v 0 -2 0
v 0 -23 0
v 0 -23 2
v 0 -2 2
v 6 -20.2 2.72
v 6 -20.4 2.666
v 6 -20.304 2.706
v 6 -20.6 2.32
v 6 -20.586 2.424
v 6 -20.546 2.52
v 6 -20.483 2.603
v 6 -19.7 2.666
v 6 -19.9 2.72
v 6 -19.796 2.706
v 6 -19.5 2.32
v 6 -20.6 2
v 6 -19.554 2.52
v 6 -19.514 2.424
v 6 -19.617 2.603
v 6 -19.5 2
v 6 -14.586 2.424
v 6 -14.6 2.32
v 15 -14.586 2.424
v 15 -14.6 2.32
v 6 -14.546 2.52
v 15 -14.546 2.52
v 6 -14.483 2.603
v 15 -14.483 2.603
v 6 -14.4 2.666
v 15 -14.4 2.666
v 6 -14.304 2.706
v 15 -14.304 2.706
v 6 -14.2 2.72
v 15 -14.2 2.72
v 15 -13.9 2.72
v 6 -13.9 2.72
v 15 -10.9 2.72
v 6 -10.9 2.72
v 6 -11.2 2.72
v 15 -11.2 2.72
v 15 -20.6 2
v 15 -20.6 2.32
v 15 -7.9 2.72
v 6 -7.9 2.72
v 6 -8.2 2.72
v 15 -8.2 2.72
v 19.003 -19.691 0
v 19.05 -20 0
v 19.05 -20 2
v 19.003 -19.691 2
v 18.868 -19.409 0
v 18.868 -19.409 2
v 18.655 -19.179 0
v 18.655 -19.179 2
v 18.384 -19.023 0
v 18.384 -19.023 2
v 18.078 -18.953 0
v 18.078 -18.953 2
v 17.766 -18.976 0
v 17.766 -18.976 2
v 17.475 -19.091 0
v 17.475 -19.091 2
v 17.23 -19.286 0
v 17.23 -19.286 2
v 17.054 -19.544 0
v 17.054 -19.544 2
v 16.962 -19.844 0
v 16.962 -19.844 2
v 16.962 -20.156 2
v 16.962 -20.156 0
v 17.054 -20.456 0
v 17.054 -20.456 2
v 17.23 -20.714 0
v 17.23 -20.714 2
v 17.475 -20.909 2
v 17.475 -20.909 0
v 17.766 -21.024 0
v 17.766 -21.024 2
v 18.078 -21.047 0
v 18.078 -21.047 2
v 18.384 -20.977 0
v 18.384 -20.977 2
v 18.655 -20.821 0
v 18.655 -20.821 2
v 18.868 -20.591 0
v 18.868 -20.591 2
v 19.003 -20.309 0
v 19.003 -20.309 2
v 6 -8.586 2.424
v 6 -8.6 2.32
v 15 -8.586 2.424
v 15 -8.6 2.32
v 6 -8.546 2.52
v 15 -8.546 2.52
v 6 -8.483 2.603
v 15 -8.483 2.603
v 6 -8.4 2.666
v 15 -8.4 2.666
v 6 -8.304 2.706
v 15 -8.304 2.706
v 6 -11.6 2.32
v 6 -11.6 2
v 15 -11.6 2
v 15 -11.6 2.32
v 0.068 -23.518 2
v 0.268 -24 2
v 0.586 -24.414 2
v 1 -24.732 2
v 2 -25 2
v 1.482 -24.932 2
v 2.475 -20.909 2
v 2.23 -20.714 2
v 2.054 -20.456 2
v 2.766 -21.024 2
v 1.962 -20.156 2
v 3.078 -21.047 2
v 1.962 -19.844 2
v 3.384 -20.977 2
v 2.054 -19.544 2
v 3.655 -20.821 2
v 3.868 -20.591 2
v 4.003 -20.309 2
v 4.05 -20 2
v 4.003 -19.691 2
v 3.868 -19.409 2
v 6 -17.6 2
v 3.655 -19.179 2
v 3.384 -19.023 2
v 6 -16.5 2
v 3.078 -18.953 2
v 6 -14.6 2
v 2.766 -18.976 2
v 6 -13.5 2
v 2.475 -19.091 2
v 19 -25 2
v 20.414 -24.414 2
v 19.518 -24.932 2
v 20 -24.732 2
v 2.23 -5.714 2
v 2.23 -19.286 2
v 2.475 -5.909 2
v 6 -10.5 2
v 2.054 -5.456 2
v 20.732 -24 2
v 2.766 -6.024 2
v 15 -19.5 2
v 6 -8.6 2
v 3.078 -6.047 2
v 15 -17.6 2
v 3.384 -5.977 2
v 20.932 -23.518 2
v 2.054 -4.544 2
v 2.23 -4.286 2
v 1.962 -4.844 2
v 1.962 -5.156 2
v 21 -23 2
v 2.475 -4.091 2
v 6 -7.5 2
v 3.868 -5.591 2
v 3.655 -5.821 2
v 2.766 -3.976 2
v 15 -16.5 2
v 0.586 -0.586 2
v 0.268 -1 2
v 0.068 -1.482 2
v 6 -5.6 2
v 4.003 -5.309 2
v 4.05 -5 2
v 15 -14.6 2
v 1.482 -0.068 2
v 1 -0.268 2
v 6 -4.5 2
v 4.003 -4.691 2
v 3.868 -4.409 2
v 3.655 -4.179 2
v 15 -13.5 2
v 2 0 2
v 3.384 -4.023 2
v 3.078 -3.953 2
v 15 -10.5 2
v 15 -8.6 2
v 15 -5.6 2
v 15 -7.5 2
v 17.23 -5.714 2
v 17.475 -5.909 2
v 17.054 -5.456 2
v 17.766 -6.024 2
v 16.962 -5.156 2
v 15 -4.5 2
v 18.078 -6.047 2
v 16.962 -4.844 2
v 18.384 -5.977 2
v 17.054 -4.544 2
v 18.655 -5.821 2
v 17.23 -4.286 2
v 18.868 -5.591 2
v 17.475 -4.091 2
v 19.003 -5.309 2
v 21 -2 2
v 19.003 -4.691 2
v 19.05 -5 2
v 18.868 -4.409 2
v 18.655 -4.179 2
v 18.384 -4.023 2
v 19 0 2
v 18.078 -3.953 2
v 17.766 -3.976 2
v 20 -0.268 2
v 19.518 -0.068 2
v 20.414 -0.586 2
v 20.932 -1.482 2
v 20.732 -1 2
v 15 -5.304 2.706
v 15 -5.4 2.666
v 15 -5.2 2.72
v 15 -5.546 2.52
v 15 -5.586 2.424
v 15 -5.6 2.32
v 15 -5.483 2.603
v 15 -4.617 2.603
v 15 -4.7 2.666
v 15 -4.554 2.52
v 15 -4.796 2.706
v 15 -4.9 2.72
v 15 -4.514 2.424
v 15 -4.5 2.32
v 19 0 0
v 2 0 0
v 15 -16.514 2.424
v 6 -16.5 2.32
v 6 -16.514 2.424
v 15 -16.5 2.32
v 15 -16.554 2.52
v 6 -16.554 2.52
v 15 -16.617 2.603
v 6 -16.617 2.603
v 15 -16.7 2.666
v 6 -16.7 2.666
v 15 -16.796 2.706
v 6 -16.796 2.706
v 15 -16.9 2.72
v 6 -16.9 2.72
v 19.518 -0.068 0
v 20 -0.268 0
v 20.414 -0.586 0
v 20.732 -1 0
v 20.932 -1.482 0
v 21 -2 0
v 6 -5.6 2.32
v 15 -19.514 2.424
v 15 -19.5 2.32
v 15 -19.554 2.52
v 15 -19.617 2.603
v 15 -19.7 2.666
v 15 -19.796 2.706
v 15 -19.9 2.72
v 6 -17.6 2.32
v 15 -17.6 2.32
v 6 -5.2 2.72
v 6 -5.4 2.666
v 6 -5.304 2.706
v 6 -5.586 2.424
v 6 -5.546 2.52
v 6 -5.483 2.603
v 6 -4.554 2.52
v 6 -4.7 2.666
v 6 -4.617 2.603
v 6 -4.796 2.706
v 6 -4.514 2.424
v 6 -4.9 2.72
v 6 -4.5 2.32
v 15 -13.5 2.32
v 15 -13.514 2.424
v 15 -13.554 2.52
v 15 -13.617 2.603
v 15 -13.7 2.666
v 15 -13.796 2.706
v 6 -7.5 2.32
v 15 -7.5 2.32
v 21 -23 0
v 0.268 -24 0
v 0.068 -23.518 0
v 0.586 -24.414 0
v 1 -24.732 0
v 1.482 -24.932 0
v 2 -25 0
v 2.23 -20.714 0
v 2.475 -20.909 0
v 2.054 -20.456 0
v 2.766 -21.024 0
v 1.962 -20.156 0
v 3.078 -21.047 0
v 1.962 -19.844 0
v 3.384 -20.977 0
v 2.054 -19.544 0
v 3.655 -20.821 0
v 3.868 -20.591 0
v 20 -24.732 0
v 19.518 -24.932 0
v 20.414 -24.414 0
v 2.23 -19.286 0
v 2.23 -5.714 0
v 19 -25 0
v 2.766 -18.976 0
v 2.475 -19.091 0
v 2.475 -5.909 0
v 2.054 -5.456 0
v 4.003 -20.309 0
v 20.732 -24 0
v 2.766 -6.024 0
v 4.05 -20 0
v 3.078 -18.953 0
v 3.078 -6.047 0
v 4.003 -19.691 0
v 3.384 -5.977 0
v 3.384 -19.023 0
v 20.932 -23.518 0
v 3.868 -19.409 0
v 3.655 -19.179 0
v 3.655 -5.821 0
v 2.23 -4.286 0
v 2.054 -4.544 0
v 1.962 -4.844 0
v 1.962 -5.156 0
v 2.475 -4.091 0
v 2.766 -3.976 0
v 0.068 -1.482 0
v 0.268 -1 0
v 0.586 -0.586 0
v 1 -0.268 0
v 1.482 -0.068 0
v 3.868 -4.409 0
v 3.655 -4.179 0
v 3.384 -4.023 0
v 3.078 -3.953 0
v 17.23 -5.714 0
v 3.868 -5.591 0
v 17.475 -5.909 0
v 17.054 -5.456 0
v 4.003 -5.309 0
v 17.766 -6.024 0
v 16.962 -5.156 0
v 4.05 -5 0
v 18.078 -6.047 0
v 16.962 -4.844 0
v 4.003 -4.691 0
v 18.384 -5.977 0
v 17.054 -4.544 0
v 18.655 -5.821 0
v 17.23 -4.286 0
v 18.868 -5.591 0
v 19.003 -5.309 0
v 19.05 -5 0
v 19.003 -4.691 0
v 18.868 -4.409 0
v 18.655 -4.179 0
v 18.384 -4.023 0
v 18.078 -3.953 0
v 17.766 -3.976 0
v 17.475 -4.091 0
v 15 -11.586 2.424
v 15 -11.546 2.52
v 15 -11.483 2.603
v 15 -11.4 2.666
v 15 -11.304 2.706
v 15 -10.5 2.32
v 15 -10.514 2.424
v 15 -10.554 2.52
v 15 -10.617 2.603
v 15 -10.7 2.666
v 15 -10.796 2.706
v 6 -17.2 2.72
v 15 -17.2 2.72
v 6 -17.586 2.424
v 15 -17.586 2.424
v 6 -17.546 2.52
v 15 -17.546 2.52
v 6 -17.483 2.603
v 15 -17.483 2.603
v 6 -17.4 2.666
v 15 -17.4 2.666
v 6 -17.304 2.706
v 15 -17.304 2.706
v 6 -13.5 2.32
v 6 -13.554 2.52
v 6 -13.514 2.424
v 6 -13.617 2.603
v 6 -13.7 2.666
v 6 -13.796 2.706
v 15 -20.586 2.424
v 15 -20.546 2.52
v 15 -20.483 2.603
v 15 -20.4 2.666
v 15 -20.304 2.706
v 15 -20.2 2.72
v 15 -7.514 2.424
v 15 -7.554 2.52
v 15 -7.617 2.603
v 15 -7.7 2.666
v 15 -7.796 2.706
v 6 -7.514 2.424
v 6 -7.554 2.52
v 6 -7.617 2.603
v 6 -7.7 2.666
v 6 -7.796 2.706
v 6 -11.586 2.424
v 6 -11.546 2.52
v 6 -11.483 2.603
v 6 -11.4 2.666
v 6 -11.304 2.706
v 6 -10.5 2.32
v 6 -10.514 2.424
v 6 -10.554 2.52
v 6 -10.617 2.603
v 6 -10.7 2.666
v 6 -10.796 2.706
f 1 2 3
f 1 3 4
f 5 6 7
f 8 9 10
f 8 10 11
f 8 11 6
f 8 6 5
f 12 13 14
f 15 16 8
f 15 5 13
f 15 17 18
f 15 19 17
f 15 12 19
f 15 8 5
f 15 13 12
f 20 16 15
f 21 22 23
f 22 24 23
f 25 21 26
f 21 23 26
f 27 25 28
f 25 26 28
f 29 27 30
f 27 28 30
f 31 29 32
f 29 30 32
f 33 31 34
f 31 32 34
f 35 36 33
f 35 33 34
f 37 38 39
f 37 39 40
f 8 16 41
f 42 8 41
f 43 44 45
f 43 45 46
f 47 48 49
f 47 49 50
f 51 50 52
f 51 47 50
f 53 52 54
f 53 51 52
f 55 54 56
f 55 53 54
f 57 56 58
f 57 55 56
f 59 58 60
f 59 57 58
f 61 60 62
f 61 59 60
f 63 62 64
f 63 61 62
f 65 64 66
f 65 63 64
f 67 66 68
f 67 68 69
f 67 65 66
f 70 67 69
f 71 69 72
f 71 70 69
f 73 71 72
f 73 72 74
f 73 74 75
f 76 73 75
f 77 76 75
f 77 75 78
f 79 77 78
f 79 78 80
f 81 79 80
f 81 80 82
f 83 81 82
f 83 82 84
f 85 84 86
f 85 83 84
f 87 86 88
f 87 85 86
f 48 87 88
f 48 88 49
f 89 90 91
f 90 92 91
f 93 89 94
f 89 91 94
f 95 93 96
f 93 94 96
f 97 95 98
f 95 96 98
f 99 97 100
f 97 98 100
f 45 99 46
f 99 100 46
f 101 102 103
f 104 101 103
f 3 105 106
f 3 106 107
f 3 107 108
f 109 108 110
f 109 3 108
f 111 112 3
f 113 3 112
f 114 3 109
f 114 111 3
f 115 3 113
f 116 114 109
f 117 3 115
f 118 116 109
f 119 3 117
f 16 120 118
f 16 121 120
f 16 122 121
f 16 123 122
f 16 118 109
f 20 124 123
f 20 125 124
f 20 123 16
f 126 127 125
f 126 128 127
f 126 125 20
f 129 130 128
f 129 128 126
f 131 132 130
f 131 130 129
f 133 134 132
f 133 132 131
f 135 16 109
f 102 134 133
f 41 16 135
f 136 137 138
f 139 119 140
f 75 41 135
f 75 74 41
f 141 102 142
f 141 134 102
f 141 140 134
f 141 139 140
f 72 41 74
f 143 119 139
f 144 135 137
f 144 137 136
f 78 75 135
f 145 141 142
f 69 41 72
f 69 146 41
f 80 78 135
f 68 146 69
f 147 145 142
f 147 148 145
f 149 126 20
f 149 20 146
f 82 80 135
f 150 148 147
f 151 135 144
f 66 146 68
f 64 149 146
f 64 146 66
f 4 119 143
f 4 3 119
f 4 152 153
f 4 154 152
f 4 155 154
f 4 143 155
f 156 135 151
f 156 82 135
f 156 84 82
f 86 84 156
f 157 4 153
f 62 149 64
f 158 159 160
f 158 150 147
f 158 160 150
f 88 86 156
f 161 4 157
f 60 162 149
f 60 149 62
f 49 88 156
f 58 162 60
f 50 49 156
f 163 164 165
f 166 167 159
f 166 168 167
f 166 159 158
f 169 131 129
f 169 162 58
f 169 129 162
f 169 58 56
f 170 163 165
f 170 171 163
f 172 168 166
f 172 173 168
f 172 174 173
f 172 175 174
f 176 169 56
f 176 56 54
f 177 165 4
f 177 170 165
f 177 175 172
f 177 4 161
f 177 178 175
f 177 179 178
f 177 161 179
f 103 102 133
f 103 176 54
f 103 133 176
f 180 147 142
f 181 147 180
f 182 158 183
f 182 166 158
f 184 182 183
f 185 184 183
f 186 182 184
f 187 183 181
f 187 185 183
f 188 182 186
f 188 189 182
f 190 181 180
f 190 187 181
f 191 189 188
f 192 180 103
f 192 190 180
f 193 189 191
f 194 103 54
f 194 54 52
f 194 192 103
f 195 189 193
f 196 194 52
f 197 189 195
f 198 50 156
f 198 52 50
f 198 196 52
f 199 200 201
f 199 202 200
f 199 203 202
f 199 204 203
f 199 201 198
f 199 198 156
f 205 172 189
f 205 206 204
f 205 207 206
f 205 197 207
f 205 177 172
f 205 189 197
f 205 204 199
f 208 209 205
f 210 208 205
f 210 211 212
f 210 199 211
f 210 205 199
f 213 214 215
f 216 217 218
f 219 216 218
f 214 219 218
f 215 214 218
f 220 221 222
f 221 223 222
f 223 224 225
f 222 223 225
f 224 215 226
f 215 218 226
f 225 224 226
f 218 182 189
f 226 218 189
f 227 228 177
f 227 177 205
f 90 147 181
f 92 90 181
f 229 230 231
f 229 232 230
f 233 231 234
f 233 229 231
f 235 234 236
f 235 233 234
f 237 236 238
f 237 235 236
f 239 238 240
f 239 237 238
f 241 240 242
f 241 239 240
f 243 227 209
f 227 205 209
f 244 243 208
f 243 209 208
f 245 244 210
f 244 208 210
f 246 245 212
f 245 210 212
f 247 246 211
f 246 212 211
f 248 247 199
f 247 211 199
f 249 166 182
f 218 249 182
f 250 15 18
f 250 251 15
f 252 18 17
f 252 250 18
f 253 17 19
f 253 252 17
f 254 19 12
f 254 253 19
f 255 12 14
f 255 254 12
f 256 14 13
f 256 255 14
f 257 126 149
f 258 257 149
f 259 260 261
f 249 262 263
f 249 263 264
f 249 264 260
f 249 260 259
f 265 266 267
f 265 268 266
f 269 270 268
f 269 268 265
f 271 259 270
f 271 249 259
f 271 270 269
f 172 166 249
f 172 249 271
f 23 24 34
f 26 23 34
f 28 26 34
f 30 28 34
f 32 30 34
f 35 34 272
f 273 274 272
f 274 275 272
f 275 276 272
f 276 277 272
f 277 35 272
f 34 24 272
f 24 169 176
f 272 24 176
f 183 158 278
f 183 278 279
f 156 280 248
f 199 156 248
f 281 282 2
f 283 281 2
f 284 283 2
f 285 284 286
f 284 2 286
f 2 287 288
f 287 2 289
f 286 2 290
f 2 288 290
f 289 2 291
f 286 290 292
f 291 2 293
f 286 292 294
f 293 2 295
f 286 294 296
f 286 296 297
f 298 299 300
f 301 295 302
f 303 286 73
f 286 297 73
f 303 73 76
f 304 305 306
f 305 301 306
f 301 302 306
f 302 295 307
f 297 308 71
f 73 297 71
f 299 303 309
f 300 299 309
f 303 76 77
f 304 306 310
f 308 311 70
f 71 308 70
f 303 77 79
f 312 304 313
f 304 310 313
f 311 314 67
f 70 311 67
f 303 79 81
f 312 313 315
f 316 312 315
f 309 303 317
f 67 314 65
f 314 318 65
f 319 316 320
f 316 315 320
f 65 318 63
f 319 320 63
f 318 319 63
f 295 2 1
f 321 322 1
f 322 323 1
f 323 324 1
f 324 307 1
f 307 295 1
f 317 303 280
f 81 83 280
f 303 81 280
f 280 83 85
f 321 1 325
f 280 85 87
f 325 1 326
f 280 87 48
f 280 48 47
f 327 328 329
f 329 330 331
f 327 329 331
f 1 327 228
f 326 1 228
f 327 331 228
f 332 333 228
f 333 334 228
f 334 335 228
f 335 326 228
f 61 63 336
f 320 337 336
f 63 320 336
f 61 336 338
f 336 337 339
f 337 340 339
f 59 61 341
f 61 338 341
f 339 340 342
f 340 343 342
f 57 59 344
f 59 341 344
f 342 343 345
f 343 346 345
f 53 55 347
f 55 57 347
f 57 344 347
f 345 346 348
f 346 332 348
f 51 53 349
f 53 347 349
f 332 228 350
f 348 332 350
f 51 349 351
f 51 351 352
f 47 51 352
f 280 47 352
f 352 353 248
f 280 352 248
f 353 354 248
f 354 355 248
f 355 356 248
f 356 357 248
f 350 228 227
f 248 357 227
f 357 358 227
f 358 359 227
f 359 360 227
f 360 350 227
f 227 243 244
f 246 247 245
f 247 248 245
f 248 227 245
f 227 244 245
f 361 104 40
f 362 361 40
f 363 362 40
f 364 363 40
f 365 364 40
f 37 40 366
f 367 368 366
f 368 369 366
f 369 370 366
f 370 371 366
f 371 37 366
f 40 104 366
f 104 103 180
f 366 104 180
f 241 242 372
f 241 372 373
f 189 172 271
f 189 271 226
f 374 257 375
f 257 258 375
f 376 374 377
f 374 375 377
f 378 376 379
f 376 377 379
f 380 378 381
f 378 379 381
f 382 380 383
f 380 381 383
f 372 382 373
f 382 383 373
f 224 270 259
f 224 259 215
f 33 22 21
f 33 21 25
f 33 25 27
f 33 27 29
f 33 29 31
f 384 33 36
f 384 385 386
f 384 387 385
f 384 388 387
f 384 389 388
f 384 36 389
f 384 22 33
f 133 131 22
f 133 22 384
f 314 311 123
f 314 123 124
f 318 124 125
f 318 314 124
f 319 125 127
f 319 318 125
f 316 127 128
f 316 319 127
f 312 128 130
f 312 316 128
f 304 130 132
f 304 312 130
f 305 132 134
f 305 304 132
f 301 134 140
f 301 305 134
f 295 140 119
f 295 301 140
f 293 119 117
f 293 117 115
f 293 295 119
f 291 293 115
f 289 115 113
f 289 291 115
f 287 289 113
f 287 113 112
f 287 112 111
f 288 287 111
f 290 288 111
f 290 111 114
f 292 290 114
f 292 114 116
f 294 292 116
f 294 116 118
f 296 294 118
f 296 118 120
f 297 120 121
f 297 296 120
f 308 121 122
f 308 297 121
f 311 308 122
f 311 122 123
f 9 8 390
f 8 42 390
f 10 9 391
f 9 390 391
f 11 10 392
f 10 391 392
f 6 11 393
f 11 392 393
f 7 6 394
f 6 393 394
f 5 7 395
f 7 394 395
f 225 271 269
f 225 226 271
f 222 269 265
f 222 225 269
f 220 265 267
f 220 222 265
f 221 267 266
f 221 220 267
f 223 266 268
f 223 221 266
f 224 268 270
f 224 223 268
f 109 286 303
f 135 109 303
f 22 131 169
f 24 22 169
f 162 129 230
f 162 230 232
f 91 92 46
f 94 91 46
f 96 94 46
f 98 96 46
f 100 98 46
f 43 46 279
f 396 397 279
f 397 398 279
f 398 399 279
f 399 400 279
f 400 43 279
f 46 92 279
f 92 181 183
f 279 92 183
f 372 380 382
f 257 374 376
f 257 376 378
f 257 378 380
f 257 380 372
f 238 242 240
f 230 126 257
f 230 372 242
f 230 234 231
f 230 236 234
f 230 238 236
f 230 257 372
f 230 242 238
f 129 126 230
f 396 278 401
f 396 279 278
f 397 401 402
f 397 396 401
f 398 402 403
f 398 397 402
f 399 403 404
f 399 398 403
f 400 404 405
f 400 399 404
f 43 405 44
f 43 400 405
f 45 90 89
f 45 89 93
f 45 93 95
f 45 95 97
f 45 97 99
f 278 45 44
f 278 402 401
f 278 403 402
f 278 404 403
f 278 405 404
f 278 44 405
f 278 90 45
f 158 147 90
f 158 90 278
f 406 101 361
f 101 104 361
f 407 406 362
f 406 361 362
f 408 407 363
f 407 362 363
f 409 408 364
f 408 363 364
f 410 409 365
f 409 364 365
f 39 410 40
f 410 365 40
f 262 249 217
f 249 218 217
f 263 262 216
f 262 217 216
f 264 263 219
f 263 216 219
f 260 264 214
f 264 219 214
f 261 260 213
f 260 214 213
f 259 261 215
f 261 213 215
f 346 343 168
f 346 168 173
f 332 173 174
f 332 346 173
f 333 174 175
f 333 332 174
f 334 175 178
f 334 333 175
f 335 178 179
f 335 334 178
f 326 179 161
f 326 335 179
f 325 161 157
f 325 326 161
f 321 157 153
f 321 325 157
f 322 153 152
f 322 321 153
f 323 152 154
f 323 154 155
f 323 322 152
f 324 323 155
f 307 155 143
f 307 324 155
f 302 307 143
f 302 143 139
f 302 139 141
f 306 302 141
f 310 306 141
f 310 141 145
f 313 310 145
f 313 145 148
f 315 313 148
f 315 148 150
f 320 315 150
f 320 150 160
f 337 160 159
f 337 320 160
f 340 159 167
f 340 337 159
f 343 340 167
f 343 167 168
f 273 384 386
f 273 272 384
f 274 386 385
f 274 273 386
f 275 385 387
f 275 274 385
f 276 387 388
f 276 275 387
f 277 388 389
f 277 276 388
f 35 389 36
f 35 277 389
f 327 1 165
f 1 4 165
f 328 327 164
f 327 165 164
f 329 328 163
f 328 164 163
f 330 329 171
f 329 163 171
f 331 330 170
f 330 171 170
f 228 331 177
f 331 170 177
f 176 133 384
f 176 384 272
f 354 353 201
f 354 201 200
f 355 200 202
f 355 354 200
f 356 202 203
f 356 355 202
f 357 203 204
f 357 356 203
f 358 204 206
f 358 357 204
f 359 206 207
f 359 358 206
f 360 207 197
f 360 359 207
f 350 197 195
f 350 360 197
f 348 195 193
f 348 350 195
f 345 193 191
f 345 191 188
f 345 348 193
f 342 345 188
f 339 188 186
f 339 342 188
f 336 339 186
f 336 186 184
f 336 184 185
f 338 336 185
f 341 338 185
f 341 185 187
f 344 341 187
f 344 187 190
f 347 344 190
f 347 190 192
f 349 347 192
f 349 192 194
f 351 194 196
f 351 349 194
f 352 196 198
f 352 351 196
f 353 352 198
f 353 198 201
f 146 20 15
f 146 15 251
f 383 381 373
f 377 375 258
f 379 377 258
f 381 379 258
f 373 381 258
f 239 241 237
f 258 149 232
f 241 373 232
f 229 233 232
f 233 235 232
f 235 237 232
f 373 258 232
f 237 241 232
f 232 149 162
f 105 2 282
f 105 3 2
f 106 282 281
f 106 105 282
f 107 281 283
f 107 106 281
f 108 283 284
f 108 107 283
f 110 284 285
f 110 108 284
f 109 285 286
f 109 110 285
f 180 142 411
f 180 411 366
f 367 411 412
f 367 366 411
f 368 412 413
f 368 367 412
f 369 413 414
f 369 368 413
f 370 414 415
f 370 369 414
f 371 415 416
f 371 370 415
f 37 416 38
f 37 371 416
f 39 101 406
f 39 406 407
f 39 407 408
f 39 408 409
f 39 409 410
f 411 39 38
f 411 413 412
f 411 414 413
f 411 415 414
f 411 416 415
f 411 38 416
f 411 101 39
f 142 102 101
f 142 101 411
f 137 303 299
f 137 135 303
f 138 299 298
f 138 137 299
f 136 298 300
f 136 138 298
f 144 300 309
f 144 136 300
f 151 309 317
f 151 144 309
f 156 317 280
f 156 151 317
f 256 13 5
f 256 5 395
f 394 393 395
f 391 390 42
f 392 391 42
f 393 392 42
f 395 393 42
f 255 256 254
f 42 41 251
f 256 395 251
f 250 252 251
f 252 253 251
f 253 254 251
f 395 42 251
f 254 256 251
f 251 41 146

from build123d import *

# Parameters (mm, degrees)
SKETCH_1_W      = 21
SKETCH_1_H      = 25
SKETCH_1_R      = 1.05
EXTRUDE_1_DEPTH = 2
SKETCH_2_W      = 9
SKETCH_2_H      = 1.1
EXTRUDE_2_DEPTH = 0.72
FILLET_1_R      = 2
FILLET_3_R      = 0.4


with BuildPart() as part:
    # 草图1 → 凸台-拉伸1 (new body)
    with BuildSketch(Plane.XY):
        with Locations((10.5, -12.5)):
            Rectangle(SKETCH_1_W, SKETCH_1_H)
        with Locations((3, -5)):
            Circle(SKETCH_1_R, mode=Mode.SUBTRACT)
        with Locations((18, -5)):
            Circle(SKETCH_1_R, mode=Mode.SUBTRACT)
        with Locations((3, -20)):
            Circle(SKETCH_1_R, mode=Mode.SUBTRACT)
        with Locations((18, -20)):
            Circle(SKETCH_1_R, mode=Mode.SUBTRACT)
    extrude(amount=EXTRUDE_1_DEPTH)

    # 草图2 → 凸台-拉伸2 (add)
    with BuildSketch(Plane.XY.offset(2)):
        with Locations((10.5, -5.05)):
            Rectangle(SKETCH_2_W, SKETCH_2_H)
        with Locations((10.5, -8.05)):
            Rectangle(SKETCH_2_W, SKETCH_2_H)
        with Locations((10.5, -11.05)):
            Rectangle(SKETCH_2_W, SKETCH_2_H)
        with Locations((10.5, -14.05)):
            Rectangle(SKETCH_2_W, SKETCH_2_H)
        with Locations((10.5, -17.05)):
            Rectangle(SKETCH_2_W, SKETCH_2_H)
        with Locations((10.5, -20.05)):
            Rectangle(SKETCH_2_W, SKETCH_2_H)
    extrude(amount=EXTRUDE_2_DEPTH)

    # 圆角1
    fillet_1_edges = [part.edges().sort_by_distance(p)[0] for p in [
        (0, 0, 1),
        (21, 0, 1),
        (21, -25, 1),
        (0, -25, 1),
    ]]
    fillet(fillet_1_edges, radius=FILLET_1_R)

    # 圆角3
    fillet_3_edges = [part.edges().sort_by_distance(p)[0] for p in [
        (10.5, -5.6, 2.72),
        (10.5, -4.5, 2.72),
        (10.5, -7.5, 2.72),
        (10.5, -8.6, 2.72),
        (10.5, -10.5, 2.72),
        (10.5, -11.6, 2.72),
        (10.5, -13.5, 2.72),
        (10.5, -14.6, 2.72),
        (10.5, -16.5, 2.72),
        (10.5, -17.6, 2.72),
        (10.5, -19.5, 2.72),
        (10.5, -20.6, 2.72),
    ]]
    fillet(fillet_3_edges, radius=FILLET_3_R)


solid = part.part
